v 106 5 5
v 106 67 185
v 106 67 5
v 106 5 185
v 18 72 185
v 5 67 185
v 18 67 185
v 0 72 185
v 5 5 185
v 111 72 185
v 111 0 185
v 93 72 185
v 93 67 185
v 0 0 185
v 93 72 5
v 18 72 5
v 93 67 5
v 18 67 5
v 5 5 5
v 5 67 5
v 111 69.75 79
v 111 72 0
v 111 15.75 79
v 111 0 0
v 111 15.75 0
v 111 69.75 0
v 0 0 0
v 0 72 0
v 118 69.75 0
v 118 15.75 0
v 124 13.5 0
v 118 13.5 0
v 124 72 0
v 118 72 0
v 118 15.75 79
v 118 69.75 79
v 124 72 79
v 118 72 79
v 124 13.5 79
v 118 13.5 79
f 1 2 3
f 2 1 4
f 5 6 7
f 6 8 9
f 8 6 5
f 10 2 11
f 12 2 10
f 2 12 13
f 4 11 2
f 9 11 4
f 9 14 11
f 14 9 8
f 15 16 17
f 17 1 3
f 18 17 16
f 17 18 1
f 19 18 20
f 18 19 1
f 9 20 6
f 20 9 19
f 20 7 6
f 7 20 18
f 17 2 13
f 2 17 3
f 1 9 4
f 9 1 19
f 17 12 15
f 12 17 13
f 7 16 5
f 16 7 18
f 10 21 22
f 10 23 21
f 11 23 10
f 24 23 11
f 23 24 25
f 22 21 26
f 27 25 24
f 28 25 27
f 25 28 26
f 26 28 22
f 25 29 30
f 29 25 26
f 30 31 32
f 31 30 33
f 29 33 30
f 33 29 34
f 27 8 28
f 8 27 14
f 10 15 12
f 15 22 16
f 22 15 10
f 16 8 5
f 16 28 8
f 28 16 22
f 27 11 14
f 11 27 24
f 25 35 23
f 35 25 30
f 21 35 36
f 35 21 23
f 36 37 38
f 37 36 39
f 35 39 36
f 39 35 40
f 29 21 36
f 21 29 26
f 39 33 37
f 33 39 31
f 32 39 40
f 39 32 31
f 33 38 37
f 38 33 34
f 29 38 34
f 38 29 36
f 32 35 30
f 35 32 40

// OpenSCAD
BATTERY_DEPTH = 80; // This includes the slide but not the button
BATTERY_HEIGHT = 180; // This should be the same for all batteries but could be reduced to reduce printing amount
BATTERY_WIDTH = 101; // This should be the same for all batteries
WALL_WIDTH = 5;

charger_slot_depth = 6;
charger_slot_outer_width = 58.5;
charger_slot_inner_width = 54;
charger_slot_height = 79;
charger_slot_total_depth = 13;

slide_depth = 18;
slide_width = 75;

total_case_width = BATTERY_WIDTH + WALL_WIDTH * 2;
total_case_depth = BATTERY_DEPTH - slide_depth + WALL_WIDTH * 2;

module outer_case() {
    height = BATTERY_HEIGHT + WALL_WIDTH;
    
    cube([total_case_width, total_case_depth, height]);
}

module battery_hole() {
    cube([BATTERY_WIDTH, BATTERY_DEPTH - slide_depth, BATTERY_HEIGHT]);
}

module slide_hole() {
    translate([(BATTERY_WIDTH - slide_width) / 2, BATTERY_DEPTH - slide_depth, 0])
    cube([slide_width, slide_depth, BATTERY_HEIGHT]);
}

module battery_cutout() {
    translate([WALL_WIDTH, WALL_WIDTH, WALL_WIDTH])
    union() {
        battery_hole();
        slide_hole();
    }
}

module charger_holder() {
    rotate([0, 0, -90])
    translate([-total_case_depth, total_case_width, 0])
    union() {
        translate([(charger_slot_outer_width - charger_slot_inner_width) / 2, 0, 0])
        cube([charger_slot_inner_width, charger_slot_total_depth, charger_slot_height]);
        
        translate([0, charger_slot_total_depth - charger_slot_depth, 0])
        cube([charger_slot_outer_width, charger_slot_depth, charger_slot_height]);
    }
}

union() {
    difference() {
        outer_case();
        battery_cutout();
    }
    charger_holder();
}
